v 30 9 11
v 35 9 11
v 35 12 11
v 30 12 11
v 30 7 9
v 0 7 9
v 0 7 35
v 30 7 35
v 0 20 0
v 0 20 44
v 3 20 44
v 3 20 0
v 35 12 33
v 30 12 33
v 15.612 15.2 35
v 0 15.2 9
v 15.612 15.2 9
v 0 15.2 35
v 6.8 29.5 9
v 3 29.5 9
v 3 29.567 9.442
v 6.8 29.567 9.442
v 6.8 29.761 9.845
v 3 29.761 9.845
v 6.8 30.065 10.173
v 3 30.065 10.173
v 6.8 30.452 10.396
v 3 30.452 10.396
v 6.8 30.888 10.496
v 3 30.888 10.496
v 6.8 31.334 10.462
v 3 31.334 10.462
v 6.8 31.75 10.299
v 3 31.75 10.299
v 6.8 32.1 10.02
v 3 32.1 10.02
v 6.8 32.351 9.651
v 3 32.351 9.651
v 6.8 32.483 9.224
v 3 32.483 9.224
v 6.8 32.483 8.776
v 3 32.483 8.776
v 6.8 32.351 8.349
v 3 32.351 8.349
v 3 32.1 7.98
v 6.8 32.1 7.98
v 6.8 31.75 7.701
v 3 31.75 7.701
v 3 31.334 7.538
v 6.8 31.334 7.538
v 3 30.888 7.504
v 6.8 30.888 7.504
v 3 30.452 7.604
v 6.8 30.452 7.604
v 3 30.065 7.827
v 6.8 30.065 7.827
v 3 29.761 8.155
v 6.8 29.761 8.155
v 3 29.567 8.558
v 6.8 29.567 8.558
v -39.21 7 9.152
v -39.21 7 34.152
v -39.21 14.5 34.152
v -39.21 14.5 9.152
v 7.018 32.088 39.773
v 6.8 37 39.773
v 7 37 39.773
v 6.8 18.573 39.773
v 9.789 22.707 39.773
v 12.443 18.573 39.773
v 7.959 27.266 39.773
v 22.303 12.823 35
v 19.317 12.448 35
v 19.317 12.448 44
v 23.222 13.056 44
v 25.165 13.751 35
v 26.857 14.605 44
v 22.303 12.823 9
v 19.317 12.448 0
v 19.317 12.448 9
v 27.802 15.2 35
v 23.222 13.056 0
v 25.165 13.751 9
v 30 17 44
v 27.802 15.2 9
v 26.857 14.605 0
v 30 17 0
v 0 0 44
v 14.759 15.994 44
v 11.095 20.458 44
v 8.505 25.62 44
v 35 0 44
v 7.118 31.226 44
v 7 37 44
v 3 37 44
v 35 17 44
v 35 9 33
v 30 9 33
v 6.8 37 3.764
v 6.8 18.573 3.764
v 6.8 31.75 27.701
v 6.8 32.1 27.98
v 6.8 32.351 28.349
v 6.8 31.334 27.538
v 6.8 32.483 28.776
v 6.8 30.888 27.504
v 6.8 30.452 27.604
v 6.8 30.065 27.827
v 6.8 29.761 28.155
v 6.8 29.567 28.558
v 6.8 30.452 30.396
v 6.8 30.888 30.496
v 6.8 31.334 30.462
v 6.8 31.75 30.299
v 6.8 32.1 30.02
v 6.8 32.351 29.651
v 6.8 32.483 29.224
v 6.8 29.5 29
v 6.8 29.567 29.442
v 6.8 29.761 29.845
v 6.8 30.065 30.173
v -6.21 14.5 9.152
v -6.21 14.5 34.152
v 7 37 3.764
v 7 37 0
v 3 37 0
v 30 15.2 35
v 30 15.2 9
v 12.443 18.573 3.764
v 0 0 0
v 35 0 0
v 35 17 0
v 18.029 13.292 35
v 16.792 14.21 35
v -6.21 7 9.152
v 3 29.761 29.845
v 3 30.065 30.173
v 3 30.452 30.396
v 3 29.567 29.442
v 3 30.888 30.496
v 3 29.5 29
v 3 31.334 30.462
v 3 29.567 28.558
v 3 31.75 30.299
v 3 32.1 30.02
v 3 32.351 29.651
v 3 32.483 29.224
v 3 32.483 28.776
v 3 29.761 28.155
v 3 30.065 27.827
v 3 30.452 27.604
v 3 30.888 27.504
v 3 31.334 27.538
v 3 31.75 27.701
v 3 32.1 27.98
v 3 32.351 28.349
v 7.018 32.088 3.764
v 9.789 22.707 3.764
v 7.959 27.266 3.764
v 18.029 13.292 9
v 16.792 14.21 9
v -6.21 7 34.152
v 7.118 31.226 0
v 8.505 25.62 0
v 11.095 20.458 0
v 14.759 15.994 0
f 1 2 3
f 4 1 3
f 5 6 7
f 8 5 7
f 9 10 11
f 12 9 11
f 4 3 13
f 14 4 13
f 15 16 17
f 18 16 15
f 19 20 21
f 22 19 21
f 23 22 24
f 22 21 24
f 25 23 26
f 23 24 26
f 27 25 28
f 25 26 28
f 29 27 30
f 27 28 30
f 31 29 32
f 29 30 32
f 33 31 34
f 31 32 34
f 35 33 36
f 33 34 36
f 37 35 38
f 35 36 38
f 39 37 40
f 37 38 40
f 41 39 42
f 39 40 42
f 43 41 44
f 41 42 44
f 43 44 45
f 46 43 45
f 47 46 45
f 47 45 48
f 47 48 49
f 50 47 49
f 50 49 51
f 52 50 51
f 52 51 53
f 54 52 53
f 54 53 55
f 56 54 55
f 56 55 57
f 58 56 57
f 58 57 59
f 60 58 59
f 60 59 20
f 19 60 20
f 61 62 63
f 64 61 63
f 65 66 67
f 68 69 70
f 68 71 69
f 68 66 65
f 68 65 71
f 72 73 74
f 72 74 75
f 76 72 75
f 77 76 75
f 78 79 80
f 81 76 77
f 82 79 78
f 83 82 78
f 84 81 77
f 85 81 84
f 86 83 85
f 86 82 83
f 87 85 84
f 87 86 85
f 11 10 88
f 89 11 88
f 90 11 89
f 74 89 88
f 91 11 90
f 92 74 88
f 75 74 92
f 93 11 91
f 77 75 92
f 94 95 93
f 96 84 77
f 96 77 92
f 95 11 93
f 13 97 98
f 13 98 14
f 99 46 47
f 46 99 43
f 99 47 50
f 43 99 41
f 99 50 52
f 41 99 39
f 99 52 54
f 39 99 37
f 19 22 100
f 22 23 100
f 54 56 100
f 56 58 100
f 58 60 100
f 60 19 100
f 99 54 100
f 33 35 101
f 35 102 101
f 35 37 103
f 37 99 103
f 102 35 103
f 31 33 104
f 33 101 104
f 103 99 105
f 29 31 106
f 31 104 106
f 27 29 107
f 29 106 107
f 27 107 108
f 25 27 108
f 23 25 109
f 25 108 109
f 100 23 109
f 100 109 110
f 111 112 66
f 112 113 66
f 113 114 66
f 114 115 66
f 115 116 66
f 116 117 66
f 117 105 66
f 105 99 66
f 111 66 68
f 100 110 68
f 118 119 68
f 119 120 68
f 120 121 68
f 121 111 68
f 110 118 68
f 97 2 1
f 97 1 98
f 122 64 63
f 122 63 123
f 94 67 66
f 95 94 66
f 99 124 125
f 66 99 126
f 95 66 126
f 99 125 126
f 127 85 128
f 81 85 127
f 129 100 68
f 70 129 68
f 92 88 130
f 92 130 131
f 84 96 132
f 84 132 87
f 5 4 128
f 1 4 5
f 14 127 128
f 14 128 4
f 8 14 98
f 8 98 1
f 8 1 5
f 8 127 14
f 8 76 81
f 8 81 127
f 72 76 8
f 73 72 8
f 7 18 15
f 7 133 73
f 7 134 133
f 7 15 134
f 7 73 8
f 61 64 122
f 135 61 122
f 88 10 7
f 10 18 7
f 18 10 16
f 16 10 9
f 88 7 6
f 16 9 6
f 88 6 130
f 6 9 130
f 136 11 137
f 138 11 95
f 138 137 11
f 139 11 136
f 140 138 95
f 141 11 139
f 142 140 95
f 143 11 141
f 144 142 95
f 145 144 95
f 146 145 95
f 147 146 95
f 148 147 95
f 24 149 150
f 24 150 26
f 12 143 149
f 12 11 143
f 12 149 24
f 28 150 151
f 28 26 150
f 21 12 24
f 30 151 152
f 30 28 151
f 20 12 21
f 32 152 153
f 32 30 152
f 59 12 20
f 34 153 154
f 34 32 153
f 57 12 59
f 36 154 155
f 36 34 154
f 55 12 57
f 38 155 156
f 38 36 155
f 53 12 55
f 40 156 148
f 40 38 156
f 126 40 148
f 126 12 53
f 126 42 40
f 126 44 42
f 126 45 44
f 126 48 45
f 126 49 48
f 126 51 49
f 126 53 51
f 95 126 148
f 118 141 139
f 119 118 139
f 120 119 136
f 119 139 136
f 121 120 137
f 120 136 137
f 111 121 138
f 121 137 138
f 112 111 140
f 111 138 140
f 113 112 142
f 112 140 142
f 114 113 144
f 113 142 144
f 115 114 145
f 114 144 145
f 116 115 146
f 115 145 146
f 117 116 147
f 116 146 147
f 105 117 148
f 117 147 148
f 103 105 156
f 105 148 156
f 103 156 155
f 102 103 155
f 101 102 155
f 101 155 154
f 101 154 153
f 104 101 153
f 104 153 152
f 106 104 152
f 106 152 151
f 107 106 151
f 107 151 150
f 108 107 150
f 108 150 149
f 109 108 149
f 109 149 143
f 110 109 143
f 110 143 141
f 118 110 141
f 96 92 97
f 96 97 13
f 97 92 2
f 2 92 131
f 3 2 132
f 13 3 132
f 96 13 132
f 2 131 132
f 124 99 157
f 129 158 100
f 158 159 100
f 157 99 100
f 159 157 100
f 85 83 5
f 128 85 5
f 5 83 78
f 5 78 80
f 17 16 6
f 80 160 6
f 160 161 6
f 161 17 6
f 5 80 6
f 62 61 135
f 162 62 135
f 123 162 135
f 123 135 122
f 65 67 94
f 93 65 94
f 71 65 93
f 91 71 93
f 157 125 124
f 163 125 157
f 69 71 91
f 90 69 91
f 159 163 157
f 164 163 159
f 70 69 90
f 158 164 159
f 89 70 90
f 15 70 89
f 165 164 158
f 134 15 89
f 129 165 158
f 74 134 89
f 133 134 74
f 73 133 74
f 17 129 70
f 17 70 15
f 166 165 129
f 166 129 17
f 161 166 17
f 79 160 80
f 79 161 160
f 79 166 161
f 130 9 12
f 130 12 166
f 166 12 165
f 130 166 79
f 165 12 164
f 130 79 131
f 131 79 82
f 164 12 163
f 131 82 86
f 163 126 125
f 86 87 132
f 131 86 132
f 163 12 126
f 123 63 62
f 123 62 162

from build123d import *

# Parameters (mm, degrees)
PAD_DEPTH       = 44
SKETCH002_W     = 8.2
SKETCH002_H     = 26
POCKET_DEPTH    = 30
SKETCH003_W     = 3
SKETCH003_H     = 22
POCKET001_DEPTH = 15
COPYSKETCH004_W = 22.072513
COPYSKETCH004_H = 36.008461
POCKET002_DEPTH = 28.201
SKETCH004_R     = 1.5
HOLE_DEPTH      = 32.001
BOX001_W        = 33
BOX001_H        = 7.5
BOX001_DEPTH    = 25


with BuildPart() as body:
    # Sketch → Pad (new body)
    with BuildSketch(Plane.XY):
        with BuildLine():
            Line((0, 20), (0, 0))
            Line((0, 0), (35, 0))
            Line((35, 0), (35, 17))
            Line((35, 17), (30, 17))
            ThreePointArc((19.317482, 12.448431), (25.087642, 13.717586), (30, 17))
            ThreePointArc((7, 37), (9.65656, 22.967177), (19.317482, 12.448431))
            Line((7, 37), (3, 37))
            Line((3, 20), (3, 37))
            Line((0, 20), (3, 20))
        make_face()
    extrude(amount=PAD_DEPTH)

    # Sketch002 (on Face1 of CopyCut) → Pocket (cut)
    with BuildSketch(Plane(origin=(0, 0, 0), x_dir=(0, -1, 0), z_dir=(-1, 0, 0))):
        with Locations((-11.1, 22)):
            Rectangle(SKETCH002_W, SKETCH002_H)
    extrude(amount=-POCKET_DEPTH, mode=Mode.SUBTRACT)

    # Sketch003 (on Face11 of Pocket) → Pocket001 (cut)
    with BuildSketch(Plane.YZ.offset(35)):
        with Locations((10.5, 22)):
            Rectangle(SKETCH003_W, SKETCH003_H)
    extrude(amount=-POCKET001_DEPTH, mode=Mode.SUBTRACT)

    # CopySketch004 → Pocket002 (cut, through all)
    with BuildSketch(Plane(origin=(6.8, 0, -3), x_dir=(0, -1, 0), z_dir=(-1, 0, 0))):
        with Locations((-29.609327, 24.76855)):
            Rectangle(COPYSKETCH004_W, COPYSKETCH004_H)
    extrude(amount=-POCKET002_DEPTH, mode=Mode.SUBTRACT)

    # Sketch004 (on Face10 of Pocket002) → Hole (cut, through all)
    with BuildSketch(Plane(origin=(3, 0, 0), x_dir=(0, -1, 0), z_dir=(-1, 0, 0))):
        with Locations((-31, 9)):
            Circle(SKETCH004_R)
        with Locations((-31, 29)):
            Circle(SKETCH004_R)
    extrude(amount=-HOLE_DEPTH, mode=Mode.SUBTRACT)


with BuildPart() as cube001:
    # Box001 → Box001 (new body)
    with BuildSketch(Plane(origin=(-39.210418, 7, 9.151581), x_dir=(1, 0, 0), z_dir=(0, 0, 1))):
        with Locations((16.5, 3.75)):
            Rectangle(BOX001_W, BOX001_H)
    extrude(amount=BOX001_DEPTH)


solid = Compound([body.part, cube001.part])
